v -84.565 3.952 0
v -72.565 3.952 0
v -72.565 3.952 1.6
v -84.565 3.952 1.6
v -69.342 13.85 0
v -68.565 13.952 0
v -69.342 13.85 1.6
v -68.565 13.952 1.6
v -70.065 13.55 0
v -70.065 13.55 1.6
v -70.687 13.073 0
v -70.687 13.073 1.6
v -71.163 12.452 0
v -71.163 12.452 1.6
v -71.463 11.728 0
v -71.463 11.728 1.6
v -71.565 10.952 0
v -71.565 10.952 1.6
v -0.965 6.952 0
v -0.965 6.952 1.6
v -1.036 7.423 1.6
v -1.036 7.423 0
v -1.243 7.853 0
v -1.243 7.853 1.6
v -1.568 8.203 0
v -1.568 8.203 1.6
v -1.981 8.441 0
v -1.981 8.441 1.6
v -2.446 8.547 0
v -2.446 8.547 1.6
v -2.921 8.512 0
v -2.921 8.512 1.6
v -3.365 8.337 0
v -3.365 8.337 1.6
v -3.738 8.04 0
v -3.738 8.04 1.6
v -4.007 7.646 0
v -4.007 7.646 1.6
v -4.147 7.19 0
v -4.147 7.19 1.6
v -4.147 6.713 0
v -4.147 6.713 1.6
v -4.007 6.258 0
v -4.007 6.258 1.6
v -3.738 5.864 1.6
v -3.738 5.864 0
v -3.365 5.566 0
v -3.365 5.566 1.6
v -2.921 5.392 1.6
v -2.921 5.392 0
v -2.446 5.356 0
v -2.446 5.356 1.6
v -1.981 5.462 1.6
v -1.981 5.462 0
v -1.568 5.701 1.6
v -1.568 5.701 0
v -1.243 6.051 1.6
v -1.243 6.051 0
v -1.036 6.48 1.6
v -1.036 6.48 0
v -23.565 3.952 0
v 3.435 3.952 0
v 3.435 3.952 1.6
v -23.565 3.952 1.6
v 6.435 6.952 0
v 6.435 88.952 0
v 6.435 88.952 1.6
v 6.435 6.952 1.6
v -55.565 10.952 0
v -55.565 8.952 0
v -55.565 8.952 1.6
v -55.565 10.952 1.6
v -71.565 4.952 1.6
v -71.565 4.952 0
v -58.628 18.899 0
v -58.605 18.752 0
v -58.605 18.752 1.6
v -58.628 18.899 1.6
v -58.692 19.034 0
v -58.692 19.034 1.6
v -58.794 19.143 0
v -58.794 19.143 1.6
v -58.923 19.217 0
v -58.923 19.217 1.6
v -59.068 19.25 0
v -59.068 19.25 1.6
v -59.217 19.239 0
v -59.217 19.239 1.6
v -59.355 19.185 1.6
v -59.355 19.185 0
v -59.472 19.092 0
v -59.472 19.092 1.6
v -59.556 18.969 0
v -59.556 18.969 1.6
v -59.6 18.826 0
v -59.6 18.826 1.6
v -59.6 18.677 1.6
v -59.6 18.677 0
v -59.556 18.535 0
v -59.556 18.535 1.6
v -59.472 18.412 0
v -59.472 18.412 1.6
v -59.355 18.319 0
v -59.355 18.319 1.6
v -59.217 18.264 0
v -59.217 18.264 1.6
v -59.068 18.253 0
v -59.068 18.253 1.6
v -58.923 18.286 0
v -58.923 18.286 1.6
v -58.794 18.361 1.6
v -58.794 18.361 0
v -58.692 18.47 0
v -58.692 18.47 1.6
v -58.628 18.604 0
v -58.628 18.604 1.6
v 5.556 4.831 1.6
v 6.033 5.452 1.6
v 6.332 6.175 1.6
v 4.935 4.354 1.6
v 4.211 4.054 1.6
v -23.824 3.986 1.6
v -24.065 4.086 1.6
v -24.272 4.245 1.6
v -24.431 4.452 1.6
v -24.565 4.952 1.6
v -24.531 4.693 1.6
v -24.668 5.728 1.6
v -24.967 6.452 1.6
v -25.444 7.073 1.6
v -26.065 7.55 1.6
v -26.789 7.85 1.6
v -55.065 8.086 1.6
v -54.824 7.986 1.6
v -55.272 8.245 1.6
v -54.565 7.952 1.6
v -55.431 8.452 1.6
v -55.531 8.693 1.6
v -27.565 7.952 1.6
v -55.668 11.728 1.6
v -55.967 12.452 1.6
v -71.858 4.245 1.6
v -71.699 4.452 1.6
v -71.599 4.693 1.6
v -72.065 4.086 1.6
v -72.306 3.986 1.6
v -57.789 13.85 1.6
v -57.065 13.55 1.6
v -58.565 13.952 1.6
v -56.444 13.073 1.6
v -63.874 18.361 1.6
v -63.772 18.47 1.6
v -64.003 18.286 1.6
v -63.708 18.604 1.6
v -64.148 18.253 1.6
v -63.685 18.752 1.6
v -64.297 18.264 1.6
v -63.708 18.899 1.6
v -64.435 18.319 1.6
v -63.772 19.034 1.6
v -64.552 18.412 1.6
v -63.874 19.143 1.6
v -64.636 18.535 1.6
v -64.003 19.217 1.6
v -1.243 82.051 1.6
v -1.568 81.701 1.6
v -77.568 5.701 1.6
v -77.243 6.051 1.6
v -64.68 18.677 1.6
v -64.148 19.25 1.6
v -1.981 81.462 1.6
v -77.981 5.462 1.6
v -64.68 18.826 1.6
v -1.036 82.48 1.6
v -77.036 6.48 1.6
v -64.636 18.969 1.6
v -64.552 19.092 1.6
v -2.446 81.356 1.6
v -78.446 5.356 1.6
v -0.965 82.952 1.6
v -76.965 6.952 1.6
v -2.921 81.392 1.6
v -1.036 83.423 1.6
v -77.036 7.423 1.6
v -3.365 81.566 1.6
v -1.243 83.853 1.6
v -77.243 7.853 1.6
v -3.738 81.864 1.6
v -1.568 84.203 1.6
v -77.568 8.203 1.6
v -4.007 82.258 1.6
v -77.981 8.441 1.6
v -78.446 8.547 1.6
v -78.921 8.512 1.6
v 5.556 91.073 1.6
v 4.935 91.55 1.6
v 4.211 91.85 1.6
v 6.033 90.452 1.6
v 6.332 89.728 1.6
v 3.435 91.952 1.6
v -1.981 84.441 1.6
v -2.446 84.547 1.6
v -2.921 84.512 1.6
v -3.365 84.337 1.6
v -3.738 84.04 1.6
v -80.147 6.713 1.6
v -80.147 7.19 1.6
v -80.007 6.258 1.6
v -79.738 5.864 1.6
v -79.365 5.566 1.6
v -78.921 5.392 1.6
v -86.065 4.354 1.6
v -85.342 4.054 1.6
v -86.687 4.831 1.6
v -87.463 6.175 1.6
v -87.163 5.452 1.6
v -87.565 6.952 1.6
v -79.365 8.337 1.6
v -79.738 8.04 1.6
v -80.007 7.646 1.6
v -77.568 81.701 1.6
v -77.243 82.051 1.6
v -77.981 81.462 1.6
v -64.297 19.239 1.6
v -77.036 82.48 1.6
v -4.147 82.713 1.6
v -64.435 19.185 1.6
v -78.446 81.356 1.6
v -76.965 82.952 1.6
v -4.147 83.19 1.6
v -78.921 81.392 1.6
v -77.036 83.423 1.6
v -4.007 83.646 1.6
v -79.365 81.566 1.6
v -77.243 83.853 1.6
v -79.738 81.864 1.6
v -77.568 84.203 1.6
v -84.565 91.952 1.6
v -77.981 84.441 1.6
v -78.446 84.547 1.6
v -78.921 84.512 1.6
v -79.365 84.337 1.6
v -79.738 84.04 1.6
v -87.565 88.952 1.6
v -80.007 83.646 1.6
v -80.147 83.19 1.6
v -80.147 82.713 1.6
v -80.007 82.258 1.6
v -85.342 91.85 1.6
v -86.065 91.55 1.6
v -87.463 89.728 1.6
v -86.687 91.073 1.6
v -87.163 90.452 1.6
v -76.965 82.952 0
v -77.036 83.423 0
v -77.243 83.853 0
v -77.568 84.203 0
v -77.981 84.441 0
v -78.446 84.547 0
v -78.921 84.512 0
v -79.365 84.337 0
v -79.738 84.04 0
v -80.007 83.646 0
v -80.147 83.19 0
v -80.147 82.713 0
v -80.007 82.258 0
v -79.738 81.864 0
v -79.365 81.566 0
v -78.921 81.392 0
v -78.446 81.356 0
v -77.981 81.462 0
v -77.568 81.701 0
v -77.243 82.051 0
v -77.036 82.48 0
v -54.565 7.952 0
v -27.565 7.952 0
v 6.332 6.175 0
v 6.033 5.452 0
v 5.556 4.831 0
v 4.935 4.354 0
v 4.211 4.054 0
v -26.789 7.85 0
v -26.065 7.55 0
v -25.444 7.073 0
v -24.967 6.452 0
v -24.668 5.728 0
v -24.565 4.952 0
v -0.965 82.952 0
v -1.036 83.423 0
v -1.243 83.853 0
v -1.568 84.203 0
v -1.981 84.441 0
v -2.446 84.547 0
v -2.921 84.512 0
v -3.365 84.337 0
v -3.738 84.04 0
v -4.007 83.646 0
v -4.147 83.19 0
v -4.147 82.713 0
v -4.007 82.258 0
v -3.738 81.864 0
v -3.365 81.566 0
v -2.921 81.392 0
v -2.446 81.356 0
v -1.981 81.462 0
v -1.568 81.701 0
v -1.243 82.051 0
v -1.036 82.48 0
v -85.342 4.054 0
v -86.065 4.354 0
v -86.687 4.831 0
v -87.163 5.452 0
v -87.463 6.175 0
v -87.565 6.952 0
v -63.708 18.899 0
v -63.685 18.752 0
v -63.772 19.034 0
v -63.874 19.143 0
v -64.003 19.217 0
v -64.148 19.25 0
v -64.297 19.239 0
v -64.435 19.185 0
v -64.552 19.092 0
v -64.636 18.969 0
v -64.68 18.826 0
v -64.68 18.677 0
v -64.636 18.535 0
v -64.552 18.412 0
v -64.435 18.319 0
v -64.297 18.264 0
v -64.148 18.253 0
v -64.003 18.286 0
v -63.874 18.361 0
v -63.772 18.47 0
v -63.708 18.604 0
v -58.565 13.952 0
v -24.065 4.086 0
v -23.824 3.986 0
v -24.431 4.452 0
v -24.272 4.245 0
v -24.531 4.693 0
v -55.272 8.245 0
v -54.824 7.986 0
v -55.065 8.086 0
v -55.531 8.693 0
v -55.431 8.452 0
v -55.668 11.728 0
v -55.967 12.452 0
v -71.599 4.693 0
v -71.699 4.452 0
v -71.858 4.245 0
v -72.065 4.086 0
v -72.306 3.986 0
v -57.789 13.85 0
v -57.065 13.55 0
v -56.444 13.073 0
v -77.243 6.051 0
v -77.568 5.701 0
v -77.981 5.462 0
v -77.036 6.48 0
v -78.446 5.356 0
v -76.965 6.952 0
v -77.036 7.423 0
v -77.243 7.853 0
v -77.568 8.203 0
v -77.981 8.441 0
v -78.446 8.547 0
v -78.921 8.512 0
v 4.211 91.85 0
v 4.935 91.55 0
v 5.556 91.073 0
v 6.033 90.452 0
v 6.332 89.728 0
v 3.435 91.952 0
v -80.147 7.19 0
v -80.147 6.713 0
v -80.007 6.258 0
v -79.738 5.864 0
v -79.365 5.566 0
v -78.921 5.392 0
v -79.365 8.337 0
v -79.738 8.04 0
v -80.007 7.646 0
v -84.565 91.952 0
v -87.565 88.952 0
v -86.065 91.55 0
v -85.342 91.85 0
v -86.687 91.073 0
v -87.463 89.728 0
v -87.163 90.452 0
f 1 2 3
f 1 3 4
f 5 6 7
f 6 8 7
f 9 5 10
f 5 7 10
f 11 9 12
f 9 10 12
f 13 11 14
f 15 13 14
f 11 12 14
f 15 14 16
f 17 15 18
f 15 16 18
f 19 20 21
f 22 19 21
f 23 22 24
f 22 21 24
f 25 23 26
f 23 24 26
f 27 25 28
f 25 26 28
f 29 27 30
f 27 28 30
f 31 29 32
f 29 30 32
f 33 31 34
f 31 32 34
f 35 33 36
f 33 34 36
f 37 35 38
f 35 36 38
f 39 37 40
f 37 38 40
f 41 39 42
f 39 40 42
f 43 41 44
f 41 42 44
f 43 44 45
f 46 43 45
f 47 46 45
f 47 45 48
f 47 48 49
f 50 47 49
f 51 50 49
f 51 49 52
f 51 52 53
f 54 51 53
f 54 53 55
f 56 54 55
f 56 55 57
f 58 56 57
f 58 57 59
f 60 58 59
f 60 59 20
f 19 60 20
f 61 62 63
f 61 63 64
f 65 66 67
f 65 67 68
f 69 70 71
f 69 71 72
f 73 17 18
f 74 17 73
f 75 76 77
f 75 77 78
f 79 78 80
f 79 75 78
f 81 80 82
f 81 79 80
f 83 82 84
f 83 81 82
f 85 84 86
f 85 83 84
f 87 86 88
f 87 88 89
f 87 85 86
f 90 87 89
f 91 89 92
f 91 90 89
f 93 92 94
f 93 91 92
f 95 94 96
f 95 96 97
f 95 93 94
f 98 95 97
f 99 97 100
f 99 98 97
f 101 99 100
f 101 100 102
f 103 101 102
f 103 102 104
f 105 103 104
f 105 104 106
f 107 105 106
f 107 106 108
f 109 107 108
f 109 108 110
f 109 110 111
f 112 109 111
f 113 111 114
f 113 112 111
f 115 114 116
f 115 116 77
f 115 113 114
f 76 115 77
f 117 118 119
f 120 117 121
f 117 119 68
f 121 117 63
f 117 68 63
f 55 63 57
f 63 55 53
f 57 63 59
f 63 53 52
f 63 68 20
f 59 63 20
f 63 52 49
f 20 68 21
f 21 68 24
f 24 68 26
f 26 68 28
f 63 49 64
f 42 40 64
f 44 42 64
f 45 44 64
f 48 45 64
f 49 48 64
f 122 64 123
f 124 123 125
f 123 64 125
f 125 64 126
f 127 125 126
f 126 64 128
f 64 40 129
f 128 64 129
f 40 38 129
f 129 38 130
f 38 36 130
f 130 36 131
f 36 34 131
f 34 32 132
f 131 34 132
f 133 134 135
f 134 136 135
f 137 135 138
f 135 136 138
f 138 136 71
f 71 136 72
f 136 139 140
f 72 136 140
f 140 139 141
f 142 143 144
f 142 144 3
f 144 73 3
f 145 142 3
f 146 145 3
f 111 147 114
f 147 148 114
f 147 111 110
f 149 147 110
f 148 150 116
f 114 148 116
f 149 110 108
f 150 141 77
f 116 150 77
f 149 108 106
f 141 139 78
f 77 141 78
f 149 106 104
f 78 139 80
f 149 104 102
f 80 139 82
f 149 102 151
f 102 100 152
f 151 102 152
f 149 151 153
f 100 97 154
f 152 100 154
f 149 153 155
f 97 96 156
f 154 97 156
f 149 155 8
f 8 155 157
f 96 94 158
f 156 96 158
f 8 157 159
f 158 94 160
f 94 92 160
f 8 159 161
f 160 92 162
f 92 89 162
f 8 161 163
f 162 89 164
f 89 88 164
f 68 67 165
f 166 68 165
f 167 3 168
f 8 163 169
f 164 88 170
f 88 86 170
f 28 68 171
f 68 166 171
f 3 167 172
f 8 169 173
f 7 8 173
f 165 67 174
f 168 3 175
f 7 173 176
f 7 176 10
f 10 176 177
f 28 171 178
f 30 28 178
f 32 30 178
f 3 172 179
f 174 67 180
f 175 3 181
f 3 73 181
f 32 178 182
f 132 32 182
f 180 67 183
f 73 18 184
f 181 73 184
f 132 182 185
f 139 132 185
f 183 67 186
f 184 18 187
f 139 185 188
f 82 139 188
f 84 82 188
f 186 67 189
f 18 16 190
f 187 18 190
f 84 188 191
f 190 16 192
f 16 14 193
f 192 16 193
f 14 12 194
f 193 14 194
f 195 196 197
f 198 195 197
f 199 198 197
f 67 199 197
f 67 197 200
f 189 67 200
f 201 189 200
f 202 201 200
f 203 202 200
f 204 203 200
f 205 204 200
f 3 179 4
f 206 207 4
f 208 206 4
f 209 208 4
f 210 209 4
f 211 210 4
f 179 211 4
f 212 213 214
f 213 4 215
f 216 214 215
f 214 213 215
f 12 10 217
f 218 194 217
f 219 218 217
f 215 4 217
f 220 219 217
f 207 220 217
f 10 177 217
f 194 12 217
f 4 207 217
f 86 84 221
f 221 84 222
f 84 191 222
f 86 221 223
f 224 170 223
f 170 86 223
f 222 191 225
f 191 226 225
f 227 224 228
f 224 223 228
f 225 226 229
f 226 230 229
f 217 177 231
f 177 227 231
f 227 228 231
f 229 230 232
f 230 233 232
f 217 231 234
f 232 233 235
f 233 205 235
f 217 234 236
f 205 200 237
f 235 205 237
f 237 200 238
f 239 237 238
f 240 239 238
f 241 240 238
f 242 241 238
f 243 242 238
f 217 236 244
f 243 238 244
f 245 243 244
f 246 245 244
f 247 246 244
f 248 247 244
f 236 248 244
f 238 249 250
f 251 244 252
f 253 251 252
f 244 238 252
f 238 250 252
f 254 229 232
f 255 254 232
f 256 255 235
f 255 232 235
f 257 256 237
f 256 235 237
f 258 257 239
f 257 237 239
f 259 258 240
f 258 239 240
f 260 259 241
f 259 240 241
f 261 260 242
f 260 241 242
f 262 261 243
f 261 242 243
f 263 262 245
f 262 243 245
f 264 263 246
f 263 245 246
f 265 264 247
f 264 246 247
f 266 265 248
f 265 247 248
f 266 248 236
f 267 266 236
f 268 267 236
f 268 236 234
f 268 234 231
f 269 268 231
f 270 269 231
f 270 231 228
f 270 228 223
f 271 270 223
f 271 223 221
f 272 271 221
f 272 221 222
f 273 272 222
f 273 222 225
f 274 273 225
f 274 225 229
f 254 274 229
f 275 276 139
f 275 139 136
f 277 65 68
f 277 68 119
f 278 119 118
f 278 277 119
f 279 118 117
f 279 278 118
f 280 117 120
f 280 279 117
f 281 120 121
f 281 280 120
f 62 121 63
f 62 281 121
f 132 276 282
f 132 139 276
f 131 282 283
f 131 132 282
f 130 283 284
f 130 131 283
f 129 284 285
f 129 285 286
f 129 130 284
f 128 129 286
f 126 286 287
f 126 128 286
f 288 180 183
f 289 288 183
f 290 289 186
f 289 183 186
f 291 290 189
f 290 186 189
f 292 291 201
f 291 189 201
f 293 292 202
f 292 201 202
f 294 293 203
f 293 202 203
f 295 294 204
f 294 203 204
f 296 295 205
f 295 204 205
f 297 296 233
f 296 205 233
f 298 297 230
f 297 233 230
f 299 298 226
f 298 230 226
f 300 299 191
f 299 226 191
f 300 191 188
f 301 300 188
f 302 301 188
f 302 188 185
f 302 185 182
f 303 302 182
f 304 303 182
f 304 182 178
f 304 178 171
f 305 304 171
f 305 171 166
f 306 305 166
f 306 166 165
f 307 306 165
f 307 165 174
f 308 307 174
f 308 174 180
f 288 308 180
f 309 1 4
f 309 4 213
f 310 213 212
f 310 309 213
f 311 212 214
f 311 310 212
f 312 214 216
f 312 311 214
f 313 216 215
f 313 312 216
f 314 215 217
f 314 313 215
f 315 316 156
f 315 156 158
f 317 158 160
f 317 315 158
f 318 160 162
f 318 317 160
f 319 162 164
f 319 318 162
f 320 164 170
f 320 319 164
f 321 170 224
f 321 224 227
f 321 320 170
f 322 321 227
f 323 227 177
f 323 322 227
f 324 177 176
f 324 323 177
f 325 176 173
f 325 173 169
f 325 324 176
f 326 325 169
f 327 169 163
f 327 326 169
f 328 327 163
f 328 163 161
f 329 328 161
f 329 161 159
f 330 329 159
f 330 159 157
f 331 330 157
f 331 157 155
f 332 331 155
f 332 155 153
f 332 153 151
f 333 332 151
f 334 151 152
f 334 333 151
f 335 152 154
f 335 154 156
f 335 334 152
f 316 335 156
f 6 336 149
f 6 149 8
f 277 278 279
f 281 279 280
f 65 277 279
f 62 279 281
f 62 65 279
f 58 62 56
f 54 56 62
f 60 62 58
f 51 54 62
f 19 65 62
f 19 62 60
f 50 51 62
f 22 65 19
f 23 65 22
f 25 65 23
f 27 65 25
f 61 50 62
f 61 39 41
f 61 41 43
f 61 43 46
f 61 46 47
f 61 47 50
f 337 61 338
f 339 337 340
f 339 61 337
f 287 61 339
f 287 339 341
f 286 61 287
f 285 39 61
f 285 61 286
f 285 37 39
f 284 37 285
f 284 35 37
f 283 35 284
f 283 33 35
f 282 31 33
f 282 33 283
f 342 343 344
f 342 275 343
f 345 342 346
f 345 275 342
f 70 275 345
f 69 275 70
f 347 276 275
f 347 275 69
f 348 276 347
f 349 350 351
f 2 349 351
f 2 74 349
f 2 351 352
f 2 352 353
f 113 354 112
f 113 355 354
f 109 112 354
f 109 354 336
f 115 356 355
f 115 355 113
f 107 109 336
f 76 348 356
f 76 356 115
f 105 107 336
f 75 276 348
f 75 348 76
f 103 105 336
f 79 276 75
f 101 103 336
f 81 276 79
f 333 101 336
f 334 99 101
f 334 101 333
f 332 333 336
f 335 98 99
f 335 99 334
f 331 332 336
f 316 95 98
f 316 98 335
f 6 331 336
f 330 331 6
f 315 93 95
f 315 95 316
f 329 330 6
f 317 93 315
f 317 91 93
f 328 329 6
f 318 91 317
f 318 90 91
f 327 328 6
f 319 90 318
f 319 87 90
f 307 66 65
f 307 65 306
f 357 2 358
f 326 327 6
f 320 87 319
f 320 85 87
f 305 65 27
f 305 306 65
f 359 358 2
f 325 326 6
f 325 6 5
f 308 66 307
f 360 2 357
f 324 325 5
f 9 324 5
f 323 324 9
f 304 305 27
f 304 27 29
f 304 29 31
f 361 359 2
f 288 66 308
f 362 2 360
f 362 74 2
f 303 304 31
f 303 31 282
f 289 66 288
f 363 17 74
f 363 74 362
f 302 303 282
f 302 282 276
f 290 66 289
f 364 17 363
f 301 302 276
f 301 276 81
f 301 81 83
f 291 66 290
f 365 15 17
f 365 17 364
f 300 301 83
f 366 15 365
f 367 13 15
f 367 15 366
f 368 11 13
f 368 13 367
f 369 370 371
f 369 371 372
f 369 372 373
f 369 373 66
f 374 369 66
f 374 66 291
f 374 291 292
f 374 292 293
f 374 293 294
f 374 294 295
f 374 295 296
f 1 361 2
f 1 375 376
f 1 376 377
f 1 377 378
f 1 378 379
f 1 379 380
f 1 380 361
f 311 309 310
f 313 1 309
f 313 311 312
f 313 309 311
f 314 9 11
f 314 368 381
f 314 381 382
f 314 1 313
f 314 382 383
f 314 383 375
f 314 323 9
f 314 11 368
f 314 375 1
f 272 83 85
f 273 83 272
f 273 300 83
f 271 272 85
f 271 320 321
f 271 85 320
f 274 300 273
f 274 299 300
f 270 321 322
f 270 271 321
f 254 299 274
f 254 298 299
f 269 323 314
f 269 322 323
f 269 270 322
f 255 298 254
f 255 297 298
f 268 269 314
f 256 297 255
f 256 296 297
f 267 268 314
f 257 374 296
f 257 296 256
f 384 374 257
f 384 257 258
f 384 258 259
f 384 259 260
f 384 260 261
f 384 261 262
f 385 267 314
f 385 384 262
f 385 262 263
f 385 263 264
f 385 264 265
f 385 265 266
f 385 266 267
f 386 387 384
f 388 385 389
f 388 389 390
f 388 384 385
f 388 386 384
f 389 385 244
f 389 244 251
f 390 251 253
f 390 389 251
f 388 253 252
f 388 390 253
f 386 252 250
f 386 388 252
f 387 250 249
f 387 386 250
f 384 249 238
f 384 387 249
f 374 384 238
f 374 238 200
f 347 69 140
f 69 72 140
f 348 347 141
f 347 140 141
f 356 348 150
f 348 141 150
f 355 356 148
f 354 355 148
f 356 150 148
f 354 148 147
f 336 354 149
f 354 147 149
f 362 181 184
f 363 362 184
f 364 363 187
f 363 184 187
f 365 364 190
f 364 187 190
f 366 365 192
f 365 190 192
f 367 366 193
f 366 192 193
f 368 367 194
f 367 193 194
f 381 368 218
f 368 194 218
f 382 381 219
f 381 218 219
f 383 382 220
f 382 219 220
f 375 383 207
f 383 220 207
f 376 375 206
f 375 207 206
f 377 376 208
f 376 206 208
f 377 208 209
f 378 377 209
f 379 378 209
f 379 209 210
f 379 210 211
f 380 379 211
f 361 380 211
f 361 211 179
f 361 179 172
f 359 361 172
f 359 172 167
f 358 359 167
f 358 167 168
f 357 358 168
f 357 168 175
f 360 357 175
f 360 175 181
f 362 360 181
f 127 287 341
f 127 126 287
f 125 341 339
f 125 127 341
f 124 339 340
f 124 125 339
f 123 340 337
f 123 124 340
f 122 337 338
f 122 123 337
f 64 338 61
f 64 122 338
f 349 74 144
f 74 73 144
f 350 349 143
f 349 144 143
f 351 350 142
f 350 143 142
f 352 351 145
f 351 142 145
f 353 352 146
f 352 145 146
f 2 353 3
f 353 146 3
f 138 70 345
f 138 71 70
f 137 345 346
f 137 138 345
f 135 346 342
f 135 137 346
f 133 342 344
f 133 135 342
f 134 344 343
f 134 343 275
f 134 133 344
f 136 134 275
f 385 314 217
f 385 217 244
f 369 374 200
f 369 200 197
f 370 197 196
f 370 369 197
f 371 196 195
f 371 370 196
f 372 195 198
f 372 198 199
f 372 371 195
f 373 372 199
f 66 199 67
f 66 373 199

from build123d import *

# Parameters (mm, degrees)
SKETCH1_R                  = 0.5
BOSS_EXTRUDE1_DEPTH        = 1.6
F_3_2_3_2_DIAMETER_HOLE3_D = 3.2
FILLET1_R                  = 3
FILLET2_R                  = 1


with BuildPart() as part:
    # Sketch1 → Boss-Extrude1 (new body)
    with BuildSketch(Plane.XY):
        with BuildLine():
            Line((-55.56534388, 7.95185693), (-55.56534388, 13.95185693))
            Line((-55.56534388, 13.95185693), (-71.56534388, 13.95185693))
            Line((-71.56534388, 13.95185693), (-71.56534388, 3.95185693))
            Line((-71.56534388, 3.95185693), (-84.56534388, 3.95185693))
            ThreePointArc((-84.56534388, 3.95185693), (-86.686664224, 4.830536587), (-87.56534388, 6.95185693))
            Line((-87.56534388, 6.95185693), (-87.56534388, 88.95185693))
            ThreePointArc((-87.56534388, 88.95185693), (-86.686664224, 91.073177274), (-84.56534388, 91.95185693))
            Line((-84.56534388, 91.95185693), (3.43465612, 91.95185693))
            ThreePointArc((3.43465612, 91.95185693), (5.555976464, 91.073177274), (6.43465612, 88.95185693))
            Line((6.43465612, 88.95185693), (6.43465612, 6.95185693))
            ThreePointArc((6.43465612, 6.95185693), (5.555976464, 4.830536587), (3.43465612, 3.95185693))
            Line((3.43465612, 3.95185693), (-24.56534388, 3.95185693))
            Line((-24.56534388, 3.95185693), (-24.56534388, 7.95185693))
            Line((-24.56534388, 7.95185693), (-55.56534388, 7.95185693))
        make_face()
        with Locations((-59.10534388, 18.75185693)):
            Circle(SKETCH1_R, mode=Mode.SUBTRACT)
        with Locations((-64.18534388, 18.75185693)):
            Circle(SKETCH1_R, mode=Mode.SUBTRACT)
    extrude(amount=BOSS_EXTRUDE1_DEPTH)

    # Ø3.2 (3.2) Diameter Hole3 (through all)
    with Locations(Plane(origin=(0, 0, 0), x_dir=(-1, 0, 0), z_dir=(0, 0, -1))):
        with Locations((78.56534388, 6.95185693), (78.56534388, 82.95185693), (2.56534388, 82.95185693), (2.56534388, 6.95185693)):
            Hole(F_3_2_3_2_DIAMETER_HOLE3_D / 2)

    # Fillet1
    fillet1_edges = [part.edges().sort_by_distance(p)[0] for p in [
        (-24.56534388, 7.95185693, 0.8),
        (-55.56534388, 13.95185693, 0.8),
        (-71.56534388, 13.95185693, 0.8),
    ]]
    fillet(fillet1_edges, radius=FILLET1_R)

    # Fillet2
    fillet2_edges = [part.edges().sort_by_distance(p)[0] for p in [
        (-24.56534388, 3.95185693, 0.8),
        (-71.56534388, 3.95185693, 0.8),
        (-55.56534388, 7.95185693, 0.8),
    ]]
    fillet(fillet2_edges, radius=FILLET2_R - 0.0001)  # a hair under: the kernel refuses the full size


solid = part.part
